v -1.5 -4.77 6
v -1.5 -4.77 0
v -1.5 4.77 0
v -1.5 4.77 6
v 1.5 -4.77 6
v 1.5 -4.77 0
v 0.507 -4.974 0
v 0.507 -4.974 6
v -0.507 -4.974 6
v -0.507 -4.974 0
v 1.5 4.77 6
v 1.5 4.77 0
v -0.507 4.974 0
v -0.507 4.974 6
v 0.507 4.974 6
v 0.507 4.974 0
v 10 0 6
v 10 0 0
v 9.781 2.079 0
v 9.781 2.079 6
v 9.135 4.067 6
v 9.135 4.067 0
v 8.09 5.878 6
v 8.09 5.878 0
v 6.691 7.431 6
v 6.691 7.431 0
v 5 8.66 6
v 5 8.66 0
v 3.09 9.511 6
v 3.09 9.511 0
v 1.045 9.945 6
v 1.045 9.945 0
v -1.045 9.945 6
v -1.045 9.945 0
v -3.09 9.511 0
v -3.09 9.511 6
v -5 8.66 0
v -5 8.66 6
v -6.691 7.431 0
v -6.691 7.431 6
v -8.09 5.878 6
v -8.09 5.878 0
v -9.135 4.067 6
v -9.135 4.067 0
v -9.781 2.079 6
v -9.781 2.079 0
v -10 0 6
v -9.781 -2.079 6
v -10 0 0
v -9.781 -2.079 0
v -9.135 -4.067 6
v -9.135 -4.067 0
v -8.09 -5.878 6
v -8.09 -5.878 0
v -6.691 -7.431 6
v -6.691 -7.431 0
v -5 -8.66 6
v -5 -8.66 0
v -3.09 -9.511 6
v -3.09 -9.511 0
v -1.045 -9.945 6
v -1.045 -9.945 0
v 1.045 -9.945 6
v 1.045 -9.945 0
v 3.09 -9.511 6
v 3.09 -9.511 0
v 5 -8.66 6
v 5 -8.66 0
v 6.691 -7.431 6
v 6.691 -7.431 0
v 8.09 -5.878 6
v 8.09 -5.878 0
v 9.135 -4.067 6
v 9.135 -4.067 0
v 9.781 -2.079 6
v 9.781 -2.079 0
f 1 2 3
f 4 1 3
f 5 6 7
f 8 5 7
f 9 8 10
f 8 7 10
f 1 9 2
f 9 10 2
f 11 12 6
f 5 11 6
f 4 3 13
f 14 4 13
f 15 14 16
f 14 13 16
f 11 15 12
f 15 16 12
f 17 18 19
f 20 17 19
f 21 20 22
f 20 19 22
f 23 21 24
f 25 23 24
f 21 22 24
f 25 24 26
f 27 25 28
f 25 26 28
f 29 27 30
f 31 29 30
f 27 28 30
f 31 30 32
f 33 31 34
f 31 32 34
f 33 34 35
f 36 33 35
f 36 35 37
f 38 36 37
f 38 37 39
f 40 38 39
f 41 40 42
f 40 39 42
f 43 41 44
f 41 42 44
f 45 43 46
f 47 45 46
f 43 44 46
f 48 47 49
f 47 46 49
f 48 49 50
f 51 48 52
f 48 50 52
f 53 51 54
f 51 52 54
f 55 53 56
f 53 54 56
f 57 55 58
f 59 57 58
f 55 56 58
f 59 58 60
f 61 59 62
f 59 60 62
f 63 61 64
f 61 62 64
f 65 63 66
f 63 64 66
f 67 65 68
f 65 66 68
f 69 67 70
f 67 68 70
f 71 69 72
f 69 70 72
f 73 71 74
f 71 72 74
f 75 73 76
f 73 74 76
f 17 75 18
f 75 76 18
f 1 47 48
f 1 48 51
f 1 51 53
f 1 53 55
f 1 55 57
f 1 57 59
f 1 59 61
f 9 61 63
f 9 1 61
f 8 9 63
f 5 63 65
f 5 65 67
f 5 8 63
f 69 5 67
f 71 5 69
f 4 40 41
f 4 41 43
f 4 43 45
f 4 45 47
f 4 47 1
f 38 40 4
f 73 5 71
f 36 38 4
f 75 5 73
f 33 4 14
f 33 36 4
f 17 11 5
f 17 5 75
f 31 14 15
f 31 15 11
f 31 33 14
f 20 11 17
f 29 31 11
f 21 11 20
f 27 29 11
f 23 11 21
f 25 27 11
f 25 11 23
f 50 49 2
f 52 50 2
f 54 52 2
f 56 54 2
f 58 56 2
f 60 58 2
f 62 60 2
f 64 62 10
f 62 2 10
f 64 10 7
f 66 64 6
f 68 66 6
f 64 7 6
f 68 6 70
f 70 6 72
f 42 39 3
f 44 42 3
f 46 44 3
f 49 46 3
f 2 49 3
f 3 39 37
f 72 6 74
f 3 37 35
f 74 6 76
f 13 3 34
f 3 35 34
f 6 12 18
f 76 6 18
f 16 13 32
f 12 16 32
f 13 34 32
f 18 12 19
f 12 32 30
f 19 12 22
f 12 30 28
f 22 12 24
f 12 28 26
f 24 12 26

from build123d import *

# Parameters (mm, degrees)
F0_R     = 10
F1_DEPTH = 6


with BuildPart() as f1:
    # F0 (on Top) → F1 (new body)
    with BuildSketch(Plane.XY):
        Circle(F0_R)
        with BuildLine():
            ThreePointArc((1.5, 4.7696960071), (4.0311288741, 2.9580398915), (5, 0))
            ThreePointArc((5, 0), (4.0311288741, -2.9580398915), (1.5, -4.7696960071))
            Line((1.5, -4.7696960071), (1.5, -5.7218258735))
            Line((1.5, -5.7218258735), (-1.5, -5.7218258735))
            Line((-1.5, -5.7218258735), (-1.5, -4.7696960071))
            ThreePointArc((-1.5, -4.7696960071), (-5, 0), (-1.5, 4.7696960071))
            Line((-1.5, 4.7696960071), (-1.5, 5.7218258735))
            Line((-1.5, 5.7218258735), (1.5, 5.7218258735))
            Line((1.5, 5.7218258735), (1.5, 4.7696960071))
        make_face(mode=Mode.SUBTRACT)
        with BuildLine():
            Line((-1.5, -4.7696960071), (-1.5, 4.7696960071))
            ThreePointArc((-1.5, 4.7696960071), (-5, 0), (-1.5, -4.7696960071))
        make_face()
        with BuildLine():
            ThreePointArc((1.5, -4.7696960071), (4.0311288741, -2.9580398915), (5, 0))
            ThreePointArc((5, 0), (4.0311288741, 2.9580398915), (1.5, 4.7696960071))
            Line((1.5, 4.7696960071), (1.5, -4.7696960071))
        make_face()
        with BuildLine():
            ThreePointArc((-1.5, 4.7696960071), (0, 5), (1.5, 4.7696960071))
            Line((1.5, 4.7696960071), (1.5, 5.7218258735))
            Line((1.5, 5.7218258735), (-1.5, 5.7218258735))
            Line((-1.5, 5.7218258735), (-1.5, 4.7696960071))
        make_face()
        with BuildLine():
            Line((1.5, -5.7218258735), (1.5, -4.7696960071))
            ThreePointArc((1.5, -4.7696960071), (0, -5), (-1.5, -4.7696960071))
            Line((-1.5, -4.7696960071), (-1.5, -5.7218258735))
            Line((-1.5, -5.7218258735), (1.5, -5.7218258735))
        make_face()
    extrude(amount=F1_DEPTH)


solid = f1.part
